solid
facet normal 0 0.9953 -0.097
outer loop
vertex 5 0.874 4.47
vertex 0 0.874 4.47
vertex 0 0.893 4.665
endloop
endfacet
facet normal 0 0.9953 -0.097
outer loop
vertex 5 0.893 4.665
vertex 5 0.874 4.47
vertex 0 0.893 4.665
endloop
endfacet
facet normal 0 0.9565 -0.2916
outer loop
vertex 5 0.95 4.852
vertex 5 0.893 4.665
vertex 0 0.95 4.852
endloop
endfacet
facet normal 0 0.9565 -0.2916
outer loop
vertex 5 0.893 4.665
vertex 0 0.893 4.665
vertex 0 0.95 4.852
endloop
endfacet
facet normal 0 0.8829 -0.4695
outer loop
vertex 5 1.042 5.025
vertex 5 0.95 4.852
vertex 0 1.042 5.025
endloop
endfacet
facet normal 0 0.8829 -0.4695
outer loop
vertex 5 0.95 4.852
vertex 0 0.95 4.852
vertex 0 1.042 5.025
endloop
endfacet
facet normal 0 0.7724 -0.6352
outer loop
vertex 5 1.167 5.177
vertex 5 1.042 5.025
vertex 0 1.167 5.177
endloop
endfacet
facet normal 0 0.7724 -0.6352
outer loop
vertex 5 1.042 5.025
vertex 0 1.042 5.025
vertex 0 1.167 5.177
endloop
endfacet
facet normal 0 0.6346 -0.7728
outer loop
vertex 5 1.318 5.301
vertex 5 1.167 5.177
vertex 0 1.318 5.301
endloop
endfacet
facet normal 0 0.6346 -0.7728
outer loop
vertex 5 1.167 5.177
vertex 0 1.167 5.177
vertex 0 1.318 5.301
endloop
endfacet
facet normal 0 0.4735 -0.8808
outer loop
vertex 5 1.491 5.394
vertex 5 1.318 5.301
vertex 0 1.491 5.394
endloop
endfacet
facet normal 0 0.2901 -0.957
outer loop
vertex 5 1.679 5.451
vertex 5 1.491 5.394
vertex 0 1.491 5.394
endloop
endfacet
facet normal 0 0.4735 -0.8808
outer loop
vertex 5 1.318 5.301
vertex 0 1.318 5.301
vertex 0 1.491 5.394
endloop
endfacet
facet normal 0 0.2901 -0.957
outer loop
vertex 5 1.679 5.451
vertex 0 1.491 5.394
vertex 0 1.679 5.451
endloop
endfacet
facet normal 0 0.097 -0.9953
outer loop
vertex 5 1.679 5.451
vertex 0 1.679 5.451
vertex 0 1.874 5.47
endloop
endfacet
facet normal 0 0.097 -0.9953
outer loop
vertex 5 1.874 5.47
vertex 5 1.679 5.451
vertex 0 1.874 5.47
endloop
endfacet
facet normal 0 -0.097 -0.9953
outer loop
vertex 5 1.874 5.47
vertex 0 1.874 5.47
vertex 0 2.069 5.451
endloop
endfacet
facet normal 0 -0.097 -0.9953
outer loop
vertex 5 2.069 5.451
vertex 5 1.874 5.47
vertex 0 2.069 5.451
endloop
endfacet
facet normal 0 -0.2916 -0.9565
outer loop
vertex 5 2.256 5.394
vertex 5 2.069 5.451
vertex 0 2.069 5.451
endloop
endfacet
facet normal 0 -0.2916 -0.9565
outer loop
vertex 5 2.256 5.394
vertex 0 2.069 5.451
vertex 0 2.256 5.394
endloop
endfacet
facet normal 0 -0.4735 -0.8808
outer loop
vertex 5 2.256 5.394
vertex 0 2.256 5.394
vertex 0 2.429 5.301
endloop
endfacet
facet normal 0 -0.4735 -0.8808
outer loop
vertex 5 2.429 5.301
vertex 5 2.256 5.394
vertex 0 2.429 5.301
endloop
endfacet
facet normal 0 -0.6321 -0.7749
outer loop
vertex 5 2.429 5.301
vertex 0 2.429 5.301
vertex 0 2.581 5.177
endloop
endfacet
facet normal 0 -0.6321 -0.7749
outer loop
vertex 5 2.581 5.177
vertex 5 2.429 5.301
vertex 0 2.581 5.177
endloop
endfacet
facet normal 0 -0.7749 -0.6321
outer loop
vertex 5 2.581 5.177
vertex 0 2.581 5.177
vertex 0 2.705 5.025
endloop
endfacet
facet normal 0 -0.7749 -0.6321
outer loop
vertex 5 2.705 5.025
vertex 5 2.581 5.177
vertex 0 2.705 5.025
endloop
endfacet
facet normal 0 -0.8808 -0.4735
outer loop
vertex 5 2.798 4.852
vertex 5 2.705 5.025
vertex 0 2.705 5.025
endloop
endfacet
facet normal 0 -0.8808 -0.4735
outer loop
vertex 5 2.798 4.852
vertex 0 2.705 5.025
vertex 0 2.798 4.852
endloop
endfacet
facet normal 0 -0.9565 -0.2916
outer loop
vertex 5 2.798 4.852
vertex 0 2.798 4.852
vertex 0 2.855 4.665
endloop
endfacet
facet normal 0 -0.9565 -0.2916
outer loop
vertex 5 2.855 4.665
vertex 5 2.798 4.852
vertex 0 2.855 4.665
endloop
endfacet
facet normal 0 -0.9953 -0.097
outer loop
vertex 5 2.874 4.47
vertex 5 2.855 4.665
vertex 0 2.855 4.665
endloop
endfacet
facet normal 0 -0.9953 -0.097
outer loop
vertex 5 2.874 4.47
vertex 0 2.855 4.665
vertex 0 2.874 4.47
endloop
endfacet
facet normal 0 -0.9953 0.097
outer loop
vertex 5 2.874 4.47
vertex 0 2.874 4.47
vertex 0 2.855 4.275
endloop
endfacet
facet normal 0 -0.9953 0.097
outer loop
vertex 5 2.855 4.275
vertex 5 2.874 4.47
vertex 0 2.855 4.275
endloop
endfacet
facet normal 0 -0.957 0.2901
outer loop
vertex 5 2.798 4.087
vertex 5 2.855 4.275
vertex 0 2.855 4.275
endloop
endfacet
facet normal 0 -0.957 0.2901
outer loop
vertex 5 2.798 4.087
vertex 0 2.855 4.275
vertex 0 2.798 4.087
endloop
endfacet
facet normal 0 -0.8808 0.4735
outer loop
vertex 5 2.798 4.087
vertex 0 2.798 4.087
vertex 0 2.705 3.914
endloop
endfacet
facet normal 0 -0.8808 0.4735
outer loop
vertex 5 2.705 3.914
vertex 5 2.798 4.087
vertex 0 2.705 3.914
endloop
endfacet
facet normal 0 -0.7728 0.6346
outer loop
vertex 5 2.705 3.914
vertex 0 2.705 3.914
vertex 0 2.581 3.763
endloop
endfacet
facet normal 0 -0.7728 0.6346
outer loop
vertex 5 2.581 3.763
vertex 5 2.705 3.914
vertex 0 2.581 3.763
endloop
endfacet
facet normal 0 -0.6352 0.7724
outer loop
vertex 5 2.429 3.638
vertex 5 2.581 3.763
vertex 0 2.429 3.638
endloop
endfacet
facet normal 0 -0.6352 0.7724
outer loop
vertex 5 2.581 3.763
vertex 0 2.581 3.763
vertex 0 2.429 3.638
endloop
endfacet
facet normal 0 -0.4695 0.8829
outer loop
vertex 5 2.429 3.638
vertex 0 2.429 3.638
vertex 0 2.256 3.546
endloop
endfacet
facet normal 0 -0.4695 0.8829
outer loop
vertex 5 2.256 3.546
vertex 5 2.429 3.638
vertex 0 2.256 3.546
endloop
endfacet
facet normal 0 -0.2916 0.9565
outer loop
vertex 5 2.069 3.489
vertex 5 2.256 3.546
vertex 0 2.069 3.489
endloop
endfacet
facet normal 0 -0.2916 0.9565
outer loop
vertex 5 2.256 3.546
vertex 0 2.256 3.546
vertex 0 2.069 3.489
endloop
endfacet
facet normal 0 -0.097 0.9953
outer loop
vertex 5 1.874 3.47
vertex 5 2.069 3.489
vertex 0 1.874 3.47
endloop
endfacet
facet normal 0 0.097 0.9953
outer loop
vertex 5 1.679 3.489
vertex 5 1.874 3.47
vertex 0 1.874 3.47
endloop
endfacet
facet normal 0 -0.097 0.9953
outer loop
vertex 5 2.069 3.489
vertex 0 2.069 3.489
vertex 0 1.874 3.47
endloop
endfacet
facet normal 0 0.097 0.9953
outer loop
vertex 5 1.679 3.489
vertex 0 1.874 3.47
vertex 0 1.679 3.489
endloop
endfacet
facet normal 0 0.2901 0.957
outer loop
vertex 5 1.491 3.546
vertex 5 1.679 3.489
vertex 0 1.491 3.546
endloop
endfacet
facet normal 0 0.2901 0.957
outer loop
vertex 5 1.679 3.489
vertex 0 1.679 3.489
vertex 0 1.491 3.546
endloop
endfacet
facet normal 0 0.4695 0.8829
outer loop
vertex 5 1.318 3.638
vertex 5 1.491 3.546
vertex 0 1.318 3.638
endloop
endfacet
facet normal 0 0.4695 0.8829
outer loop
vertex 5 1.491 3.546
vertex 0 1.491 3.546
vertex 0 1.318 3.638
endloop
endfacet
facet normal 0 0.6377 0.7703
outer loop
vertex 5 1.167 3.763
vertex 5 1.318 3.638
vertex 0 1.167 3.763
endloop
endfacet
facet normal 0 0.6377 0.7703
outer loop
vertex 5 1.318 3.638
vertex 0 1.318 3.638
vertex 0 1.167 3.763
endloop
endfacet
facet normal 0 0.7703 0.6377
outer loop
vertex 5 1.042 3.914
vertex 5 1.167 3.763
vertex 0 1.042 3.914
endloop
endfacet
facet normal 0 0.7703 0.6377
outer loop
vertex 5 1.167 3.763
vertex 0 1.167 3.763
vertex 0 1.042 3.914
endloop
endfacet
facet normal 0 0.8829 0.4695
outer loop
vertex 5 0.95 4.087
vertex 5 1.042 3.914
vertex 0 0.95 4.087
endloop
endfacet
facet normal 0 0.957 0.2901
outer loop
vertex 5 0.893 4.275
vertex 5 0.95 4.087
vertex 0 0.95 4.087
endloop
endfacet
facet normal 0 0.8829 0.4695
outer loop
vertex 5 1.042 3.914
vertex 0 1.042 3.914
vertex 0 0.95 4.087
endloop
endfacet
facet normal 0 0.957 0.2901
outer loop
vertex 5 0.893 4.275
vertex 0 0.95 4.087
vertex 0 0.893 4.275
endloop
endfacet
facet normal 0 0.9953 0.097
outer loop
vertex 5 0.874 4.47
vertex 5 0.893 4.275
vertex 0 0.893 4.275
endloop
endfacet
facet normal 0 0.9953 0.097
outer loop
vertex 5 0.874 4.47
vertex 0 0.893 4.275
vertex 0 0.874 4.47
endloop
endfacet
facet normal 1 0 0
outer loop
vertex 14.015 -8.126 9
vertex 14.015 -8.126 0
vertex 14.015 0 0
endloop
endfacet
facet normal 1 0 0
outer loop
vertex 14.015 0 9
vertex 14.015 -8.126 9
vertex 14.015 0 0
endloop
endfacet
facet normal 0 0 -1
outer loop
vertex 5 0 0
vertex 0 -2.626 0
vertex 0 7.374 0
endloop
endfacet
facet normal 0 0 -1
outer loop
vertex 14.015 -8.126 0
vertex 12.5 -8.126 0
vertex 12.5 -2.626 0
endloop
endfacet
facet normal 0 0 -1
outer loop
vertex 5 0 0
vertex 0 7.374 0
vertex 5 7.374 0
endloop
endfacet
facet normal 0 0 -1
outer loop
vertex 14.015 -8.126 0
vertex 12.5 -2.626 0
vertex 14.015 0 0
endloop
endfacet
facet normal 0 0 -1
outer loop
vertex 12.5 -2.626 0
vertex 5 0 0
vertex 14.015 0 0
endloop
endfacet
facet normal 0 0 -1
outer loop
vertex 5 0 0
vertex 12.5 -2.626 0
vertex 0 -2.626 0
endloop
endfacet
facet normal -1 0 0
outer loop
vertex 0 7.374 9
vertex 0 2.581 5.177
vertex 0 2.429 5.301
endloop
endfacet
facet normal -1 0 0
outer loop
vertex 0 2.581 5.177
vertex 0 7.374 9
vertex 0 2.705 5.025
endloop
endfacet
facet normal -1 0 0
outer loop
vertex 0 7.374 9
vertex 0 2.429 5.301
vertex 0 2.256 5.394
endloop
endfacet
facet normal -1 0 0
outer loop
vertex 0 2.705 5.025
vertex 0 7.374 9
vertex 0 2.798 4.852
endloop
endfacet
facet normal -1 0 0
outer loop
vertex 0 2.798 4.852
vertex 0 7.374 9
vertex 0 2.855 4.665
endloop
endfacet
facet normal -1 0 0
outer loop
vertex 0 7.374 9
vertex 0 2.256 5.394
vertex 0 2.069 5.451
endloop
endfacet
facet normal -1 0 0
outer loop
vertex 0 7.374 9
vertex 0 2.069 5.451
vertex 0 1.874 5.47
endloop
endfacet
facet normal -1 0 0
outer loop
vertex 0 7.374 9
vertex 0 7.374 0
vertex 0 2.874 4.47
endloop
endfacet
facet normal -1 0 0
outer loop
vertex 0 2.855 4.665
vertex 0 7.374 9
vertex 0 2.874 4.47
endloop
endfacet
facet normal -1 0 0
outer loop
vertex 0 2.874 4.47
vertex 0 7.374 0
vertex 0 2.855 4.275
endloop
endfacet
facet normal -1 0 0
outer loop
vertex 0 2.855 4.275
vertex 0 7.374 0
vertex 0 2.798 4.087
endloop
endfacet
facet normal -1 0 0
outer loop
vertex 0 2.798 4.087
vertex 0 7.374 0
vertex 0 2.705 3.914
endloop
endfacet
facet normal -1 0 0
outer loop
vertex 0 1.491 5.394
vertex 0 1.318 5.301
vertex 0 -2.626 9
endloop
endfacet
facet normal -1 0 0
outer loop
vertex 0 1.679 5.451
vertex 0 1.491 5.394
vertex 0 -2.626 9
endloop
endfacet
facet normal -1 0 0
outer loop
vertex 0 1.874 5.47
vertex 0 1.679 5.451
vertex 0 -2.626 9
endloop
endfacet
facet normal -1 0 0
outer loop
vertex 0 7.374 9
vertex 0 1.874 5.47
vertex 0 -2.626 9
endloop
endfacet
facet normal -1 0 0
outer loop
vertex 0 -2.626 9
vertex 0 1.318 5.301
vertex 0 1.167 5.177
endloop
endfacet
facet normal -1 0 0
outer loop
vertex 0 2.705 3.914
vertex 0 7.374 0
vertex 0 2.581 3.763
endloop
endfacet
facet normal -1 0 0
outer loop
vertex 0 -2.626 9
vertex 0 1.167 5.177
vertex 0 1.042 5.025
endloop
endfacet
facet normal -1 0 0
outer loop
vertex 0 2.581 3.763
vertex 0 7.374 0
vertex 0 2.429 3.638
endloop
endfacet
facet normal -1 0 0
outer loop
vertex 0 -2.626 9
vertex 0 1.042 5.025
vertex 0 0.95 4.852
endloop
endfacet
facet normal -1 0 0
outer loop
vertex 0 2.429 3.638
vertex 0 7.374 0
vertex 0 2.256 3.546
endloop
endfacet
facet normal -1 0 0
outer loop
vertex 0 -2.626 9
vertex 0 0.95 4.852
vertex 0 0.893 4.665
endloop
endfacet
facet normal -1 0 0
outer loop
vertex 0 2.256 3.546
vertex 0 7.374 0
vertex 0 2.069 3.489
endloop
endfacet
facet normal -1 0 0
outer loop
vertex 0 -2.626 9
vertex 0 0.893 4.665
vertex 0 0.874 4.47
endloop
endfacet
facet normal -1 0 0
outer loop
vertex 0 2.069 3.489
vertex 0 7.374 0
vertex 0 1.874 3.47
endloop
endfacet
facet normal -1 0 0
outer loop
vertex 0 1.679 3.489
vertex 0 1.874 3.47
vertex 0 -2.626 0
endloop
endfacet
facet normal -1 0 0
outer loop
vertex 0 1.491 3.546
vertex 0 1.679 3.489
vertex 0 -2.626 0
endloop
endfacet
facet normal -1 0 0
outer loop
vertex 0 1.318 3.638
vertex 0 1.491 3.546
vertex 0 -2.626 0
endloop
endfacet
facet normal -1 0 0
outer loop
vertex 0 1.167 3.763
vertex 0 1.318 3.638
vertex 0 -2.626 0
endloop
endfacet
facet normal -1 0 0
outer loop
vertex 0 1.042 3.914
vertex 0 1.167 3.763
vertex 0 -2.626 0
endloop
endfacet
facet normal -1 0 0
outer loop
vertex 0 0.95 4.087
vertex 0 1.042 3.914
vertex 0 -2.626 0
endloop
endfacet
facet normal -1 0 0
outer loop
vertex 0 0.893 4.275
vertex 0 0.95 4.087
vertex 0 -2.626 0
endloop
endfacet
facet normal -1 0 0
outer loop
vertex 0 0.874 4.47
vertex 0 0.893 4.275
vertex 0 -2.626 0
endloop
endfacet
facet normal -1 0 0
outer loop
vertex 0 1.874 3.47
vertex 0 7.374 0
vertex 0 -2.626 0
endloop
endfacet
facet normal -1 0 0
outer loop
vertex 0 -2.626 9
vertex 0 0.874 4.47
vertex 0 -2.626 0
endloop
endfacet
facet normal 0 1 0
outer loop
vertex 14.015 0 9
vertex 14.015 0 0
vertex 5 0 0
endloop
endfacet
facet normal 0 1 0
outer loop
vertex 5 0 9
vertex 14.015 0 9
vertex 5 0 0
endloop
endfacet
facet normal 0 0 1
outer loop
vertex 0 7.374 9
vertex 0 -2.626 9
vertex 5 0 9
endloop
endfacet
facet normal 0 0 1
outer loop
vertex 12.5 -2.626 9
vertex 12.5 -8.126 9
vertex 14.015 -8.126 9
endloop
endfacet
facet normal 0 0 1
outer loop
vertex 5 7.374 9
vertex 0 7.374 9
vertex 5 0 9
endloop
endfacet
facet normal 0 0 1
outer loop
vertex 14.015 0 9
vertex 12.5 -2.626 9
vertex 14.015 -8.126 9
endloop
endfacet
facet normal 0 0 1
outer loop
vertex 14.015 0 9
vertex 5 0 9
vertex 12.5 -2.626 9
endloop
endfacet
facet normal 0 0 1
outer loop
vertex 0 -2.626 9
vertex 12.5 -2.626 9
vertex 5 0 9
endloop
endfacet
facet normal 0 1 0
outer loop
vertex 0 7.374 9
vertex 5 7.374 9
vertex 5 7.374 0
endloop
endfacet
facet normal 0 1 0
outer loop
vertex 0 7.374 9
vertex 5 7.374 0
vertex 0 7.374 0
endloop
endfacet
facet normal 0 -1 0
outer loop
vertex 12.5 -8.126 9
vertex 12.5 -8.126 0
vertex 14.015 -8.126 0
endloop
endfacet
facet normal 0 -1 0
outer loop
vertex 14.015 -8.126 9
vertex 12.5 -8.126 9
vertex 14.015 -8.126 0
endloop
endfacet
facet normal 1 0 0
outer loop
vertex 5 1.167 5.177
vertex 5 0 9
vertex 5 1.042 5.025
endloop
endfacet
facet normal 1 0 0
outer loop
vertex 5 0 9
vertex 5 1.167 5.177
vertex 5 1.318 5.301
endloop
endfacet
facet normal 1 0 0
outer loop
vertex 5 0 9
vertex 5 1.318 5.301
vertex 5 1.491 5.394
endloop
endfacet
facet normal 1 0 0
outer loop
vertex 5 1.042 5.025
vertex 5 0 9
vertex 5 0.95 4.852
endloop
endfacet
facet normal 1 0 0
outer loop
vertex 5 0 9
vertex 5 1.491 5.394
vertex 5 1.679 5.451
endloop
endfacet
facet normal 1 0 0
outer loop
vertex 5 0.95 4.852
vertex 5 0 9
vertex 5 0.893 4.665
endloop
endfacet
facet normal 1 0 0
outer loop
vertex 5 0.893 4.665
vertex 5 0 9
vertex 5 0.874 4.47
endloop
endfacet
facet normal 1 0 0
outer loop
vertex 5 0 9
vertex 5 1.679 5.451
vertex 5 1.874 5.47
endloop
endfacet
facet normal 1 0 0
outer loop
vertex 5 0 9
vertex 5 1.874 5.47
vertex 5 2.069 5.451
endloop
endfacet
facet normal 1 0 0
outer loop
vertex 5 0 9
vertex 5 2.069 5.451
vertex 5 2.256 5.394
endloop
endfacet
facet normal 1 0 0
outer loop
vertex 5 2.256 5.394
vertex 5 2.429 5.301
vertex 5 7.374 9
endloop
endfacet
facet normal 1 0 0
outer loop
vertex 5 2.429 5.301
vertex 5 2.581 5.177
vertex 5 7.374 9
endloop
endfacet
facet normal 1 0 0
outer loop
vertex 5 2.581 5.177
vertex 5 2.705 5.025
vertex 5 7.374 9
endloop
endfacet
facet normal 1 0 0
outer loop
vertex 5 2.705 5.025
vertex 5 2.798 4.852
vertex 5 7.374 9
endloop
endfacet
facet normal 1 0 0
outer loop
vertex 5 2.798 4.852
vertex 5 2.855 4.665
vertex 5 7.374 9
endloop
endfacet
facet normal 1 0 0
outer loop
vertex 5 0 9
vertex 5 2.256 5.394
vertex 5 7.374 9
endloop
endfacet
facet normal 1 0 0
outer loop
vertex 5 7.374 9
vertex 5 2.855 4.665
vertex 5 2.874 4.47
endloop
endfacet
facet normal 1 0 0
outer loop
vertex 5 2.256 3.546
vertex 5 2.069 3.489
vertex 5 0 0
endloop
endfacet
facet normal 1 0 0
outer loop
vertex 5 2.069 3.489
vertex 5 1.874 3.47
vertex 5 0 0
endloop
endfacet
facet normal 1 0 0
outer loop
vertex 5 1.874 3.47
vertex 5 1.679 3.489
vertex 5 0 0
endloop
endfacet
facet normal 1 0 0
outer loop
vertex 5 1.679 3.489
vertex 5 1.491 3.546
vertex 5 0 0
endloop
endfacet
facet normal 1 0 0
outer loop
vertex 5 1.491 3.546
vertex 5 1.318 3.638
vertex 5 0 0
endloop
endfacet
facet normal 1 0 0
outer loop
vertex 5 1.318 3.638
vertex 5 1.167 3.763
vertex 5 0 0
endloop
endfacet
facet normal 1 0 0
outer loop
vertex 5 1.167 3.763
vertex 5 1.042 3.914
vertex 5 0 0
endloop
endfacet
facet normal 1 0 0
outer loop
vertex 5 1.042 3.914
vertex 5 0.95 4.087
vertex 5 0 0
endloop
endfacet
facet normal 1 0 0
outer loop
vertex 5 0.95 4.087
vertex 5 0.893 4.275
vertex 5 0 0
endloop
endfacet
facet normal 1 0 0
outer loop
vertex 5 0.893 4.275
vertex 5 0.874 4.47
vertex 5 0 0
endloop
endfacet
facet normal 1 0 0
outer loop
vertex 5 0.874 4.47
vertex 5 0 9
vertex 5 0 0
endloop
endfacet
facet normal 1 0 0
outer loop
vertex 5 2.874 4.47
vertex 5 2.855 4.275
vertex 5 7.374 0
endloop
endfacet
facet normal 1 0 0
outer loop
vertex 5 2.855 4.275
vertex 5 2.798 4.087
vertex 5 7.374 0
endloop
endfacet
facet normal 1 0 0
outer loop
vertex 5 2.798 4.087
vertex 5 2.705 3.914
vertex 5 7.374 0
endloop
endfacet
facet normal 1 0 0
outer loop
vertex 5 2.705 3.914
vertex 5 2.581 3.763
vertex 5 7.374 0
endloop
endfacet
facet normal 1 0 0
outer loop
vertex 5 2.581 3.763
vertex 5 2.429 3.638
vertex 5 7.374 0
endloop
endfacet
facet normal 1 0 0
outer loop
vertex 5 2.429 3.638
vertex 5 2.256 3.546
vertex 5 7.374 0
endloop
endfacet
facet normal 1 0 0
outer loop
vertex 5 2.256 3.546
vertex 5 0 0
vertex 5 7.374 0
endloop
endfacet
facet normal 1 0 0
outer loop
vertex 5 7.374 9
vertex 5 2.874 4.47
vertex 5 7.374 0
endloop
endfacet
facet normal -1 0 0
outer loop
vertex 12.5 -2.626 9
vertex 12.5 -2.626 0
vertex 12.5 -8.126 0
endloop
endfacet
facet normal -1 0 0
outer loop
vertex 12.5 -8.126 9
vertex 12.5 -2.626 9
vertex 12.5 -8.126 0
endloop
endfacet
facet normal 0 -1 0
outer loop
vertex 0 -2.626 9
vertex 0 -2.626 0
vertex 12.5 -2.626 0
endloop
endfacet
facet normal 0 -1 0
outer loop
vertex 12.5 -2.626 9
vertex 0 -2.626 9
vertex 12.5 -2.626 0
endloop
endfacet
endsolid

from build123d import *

# Parameters (mm, degrees)
F1_DEPTH = 9
F2_R     = 1
F3_DEPTH = 25


with BuildPart() as f1:
    # F0 (on Top) → F1 (new body)
    with BuildSketch(Plane.XY):
        Polygon((5, 7.373742), (0, 7.373742), (0, -2.626258), (12.5, -2.626258), (12.5, -8.126258), (14.015152, -8.126258), (14.015152, -2.626258), (14.015152, 0), (5, 0), align=None)
    extrude(amount=F1_DEPTH)

    # F2 (on face) → F3 (cut)
    with BuildSketch(Plane(origin=(0, 0, 0), x_dir=(0, -1, 0), z_dir=(-1, 0, 0))):
        with Locations((-1.873742, 4.469738)):
            Circle(F2_R)
    extrude(amount=-F3_DEPTH, mode=Mode.SUBTRACT)


solid = f1.part
